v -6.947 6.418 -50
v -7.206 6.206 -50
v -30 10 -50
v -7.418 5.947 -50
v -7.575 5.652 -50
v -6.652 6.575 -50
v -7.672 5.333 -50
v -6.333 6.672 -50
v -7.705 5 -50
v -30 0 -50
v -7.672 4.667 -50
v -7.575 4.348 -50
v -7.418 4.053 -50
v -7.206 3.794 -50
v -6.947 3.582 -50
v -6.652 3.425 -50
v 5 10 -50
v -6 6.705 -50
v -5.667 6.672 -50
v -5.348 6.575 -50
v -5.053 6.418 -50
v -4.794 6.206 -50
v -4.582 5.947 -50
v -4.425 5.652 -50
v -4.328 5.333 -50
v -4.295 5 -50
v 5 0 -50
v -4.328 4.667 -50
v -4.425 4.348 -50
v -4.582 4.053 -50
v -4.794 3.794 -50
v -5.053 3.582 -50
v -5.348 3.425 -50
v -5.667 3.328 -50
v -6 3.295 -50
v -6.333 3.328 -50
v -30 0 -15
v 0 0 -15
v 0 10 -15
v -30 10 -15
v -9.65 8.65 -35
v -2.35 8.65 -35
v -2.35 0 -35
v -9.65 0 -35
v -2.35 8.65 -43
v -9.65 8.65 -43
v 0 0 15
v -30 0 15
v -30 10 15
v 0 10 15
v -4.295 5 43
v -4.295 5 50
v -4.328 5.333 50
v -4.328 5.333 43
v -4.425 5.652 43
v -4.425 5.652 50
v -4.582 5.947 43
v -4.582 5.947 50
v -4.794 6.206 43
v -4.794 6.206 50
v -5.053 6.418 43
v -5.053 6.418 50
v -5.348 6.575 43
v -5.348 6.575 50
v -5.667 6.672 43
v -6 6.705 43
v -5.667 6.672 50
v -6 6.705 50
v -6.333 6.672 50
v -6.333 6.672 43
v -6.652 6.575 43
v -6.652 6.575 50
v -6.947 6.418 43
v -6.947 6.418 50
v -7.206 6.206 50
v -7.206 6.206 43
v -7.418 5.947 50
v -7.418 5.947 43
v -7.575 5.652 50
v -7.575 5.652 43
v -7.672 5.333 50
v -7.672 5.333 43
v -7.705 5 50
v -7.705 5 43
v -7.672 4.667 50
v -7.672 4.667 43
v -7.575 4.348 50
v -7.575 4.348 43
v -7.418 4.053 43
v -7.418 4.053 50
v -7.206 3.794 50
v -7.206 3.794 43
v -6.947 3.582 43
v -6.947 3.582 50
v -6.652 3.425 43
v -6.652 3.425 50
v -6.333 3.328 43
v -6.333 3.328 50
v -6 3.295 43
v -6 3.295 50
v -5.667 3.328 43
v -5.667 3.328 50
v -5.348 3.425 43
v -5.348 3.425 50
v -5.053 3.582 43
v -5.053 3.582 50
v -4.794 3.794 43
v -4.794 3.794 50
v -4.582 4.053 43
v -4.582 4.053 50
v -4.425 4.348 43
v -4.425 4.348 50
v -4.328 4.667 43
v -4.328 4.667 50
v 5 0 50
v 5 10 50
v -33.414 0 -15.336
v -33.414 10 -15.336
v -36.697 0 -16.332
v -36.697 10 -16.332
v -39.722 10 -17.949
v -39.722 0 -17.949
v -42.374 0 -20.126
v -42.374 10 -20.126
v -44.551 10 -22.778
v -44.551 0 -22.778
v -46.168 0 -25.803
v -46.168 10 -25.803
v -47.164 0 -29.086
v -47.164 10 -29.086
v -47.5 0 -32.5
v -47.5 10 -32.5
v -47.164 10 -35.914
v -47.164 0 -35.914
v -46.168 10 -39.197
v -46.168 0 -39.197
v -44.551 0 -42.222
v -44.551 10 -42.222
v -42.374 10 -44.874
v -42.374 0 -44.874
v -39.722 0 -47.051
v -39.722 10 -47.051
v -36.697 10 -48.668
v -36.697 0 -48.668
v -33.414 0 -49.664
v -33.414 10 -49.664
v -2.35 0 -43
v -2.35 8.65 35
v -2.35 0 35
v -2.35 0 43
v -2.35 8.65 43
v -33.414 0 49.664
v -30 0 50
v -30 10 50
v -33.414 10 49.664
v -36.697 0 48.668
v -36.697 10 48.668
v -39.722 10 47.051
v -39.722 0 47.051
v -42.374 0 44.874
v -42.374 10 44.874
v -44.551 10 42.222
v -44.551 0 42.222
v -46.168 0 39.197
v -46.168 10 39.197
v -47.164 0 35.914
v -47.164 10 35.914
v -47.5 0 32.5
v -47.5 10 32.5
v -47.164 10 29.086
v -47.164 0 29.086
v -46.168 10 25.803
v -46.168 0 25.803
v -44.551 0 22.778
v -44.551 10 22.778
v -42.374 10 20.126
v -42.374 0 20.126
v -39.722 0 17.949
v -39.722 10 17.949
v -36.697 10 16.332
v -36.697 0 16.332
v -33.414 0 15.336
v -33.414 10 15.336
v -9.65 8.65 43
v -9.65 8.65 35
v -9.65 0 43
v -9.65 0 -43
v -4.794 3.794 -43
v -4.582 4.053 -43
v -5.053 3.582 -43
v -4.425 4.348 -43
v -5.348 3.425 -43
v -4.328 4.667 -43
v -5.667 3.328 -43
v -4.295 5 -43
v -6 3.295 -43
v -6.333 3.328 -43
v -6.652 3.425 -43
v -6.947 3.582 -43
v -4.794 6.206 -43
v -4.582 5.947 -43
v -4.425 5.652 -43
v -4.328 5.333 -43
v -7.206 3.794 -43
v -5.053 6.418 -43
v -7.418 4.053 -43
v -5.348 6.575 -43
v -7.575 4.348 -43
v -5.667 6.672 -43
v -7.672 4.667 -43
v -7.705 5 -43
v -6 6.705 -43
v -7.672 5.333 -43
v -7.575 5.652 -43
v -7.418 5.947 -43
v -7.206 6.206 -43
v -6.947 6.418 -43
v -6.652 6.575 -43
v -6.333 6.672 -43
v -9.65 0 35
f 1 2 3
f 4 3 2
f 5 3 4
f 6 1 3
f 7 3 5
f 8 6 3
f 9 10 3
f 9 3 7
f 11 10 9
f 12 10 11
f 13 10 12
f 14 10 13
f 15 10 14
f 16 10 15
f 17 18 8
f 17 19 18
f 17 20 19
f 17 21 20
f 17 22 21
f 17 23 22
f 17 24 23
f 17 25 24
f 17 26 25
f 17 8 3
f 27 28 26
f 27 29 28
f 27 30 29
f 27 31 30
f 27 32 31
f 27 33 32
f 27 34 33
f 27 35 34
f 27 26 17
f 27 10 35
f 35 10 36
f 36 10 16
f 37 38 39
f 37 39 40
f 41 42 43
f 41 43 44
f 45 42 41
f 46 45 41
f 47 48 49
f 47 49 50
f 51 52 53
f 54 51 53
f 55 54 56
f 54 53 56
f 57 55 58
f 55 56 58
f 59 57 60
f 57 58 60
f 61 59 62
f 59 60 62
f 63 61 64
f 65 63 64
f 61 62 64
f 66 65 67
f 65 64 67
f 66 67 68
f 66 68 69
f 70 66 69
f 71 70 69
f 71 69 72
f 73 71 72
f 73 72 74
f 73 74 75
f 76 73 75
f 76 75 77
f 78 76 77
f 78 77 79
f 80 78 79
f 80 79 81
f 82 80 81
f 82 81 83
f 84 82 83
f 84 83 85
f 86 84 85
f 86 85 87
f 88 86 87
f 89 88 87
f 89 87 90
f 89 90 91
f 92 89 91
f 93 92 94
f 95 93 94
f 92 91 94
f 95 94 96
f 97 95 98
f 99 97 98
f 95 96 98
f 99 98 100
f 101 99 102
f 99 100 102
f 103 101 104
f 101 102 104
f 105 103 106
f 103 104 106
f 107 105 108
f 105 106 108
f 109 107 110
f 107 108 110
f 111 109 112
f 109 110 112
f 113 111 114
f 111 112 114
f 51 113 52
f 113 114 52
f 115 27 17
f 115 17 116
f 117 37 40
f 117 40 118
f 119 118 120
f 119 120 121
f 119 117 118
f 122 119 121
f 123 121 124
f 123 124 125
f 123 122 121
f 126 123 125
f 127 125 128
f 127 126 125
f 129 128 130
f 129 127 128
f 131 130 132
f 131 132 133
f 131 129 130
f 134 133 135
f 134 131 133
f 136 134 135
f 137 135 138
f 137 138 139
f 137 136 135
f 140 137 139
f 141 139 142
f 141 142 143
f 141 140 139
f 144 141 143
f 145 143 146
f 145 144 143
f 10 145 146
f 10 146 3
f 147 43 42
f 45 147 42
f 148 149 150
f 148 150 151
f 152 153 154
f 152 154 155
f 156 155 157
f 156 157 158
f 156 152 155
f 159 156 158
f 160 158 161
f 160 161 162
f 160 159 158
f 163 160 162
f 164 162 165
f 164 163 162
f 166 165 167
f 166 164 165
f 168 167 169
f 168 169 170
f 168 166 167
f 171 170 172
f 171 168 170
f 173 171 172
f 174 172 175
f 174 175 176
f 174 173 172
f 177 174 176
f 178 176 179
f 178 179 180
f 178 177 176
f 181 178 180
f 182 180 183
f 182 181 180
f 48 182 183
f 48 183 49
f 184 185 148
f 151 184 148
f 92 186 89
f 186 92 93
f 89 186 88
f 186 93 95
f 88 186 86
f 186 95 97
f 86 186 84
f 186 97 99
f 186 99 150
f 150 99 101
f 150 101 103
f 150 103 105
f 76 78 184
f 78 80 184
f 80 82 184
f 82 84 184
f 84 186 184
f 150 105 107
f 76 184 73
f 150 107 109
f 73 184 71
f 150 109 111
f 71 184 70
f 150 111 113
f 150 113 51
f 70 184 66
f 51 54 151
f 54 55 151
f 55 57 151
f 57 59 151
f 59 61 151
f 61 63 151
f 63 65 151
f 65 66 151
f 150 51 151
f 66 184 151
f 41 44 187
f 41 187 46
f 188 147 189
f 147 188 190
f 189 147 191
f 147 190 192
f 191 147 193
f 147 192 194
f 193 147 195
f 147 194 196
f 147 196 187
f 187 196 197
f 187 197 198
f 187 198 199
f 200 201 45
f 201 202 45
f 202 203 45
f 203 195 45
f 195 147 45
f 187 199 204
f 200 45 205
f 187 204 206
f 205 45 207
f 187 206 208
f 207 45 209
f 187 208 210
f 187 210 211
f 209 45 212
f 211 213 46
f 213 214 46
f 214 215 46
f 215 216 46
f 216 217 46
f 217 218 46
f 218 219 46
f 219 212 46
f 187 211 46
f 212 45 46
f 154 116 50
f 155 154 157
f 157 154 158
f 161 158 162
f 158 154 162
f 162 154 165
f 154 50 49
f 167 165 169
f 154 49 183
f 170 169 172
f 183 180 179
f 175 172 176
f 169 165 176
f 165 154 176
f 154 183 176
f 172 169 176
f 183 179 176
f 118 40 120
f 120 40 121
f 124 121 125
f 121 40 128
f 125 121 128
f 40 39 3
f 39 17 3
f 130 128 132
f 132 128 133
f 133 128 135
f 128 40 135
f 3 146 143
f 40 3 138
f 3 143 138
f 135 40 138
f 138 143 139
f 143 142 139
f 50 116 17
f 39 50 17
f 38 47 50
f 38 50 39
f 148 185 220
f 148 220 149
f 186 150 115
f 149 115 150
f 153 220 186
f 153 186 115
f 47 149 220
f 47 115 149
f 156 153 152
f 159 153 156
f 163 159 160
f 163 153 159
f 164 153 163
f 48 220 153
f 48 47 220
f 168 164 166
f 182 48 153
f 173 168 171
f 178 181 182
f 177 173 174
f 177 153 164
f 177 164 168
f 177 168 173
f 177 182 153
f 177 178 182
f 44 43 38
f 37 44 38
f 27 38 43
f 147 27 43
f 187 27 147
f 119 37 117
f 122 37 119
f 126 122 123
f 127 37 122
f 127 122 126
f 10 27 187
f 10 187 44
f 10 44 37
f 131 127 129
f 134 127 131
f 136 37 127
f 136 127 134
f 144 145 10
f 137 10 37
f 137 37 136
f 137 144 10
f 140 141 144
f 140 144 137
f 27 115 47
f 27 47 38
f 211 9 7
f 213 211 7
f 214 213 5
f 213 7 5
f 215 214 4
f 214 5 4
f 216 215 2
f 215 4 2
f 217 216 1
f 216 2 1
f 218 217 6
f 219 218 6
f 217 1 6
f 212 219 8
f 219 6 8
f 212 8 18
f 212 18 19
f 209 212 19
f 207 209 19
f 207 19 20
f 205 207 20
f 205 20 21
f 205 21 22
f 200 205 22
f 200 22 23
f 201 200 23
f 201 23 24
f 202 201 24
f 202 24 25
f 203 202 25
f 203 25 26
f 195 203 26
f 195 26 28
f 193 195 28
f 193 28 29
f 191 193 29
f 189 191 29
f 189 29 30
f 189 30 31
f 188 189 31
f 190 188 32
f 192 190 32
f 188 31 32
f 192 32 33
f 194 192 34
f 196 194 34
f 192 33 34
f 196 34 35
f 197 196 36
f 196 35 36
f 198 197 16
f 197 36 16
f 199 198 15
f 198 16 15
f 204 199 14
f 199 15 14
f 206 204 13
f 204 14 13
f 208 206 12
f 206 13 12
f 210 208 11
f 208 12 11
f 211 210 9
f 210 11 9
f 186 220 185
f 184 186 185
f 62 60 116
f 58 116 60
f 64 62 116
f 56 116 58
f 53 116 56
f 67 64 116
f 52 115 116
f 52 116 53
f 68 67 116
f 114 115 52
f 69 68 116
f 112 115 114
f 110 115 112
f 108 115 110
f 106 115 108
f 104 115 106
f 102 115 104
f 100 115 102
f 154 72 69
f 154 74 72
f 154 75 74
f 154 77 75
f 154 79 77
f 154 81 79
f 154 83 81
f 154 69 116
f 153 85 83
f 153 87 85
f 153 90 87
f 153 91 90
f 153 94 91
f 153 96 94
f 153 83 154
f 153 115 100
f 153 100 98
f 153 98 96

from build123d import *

# Parameters (mm, degrees)
BOSS_EXTRUDE1_DEPTH = 10
SKETCH2_R           = 1.705
CUT_EXTRUDE1_DEPTH  = 15
SKETCH3_W           = 7.3
SKETCH3_H           = 8.65
CUT_EXTRUDE2_DEPTH  = 8
SKETCH4_R           = 1.705
CUT_EXTRUDE3_DEPTH  = 15
SKETCH5_W           = 7.3
SKETCH5_H           = 8.65
CUT_EXTRUDE4_DEPTH  = 8


with BuildPart() as part:
    # Sketch1 → Boss-Extrude1 (new body)
    with BuildSketch(Plane(origin=(0, 0, 0), x_dir=(1, 0, 0), z_dir=(0, 1, 0))):
        with BuildLine():
            Line((5, 50), (5, -50))
            Line((5, -50), (-30, -50))
            ThreePointArc((-30, -50), (-47.5, -32.5), (-30, -15))
            Line((-30, -15), (0, -15))
            Line((0, -15), (0, 15))
            Line((0, 15), (-30, 15))
            ThreePointArc((-30, 15), (-47.5, 32.5), (-30, 50))
            Line((-30, 50), (5, 50))
        make_face()
    extrude(amount=BOSS_EXTRUDE1_DEPTH)

    # Sketch2 → Cut-Extrude1 (cut)
    with BuildSketch(Plane.XY.offset(50)):
        with Locations((-6, 5)):
            Circle(SKETCH2_R)
    extrude(amount=-CUT_EXTRUDE1_DEPTH, mode=Mode.SUBTRACT)

    # Sketch3 → Cut-Extrude2 (cut)
    with BuildSketch(Plane.XY.offset(35)):
        with Locations((-6, 4.325)):
            Rectangle(SKETCH3_W, SKETCH3_H)
    extrude(amount=CUT_EXTRUDE2_DEPTH, mode=Mode.SUBTRACT)

    # Sketch4 → Cut-Extrude3 (cut)
    with BuildSketch(Plane(origin=(0, 0, -50), x_dir=(-1, 0, 0), z_dir=(0, 0, -1))):
        with Locations((6, 5)):
            Circle(SKETCH4_R)
    extrude(amount=-CUT_EXTRUDE3_DEPTH, mode=Mode.SUBTRACT)

    # Sketch5 → Cut-Extrude4 (cut)
    with BuildSketch(Plane(origin=(0, 0, -35), x_dir=(-1, 0, 0), z_dir=(0, 0, -1))):
        with Locations((6, 4.325)):
            Rectangle(SKETCH5_W, SKETCH5_H)
    extrude(amount=CUT_EXTRUDE4_DEPTH, mode=Mode.SUBTRACT)


solid = part.part
